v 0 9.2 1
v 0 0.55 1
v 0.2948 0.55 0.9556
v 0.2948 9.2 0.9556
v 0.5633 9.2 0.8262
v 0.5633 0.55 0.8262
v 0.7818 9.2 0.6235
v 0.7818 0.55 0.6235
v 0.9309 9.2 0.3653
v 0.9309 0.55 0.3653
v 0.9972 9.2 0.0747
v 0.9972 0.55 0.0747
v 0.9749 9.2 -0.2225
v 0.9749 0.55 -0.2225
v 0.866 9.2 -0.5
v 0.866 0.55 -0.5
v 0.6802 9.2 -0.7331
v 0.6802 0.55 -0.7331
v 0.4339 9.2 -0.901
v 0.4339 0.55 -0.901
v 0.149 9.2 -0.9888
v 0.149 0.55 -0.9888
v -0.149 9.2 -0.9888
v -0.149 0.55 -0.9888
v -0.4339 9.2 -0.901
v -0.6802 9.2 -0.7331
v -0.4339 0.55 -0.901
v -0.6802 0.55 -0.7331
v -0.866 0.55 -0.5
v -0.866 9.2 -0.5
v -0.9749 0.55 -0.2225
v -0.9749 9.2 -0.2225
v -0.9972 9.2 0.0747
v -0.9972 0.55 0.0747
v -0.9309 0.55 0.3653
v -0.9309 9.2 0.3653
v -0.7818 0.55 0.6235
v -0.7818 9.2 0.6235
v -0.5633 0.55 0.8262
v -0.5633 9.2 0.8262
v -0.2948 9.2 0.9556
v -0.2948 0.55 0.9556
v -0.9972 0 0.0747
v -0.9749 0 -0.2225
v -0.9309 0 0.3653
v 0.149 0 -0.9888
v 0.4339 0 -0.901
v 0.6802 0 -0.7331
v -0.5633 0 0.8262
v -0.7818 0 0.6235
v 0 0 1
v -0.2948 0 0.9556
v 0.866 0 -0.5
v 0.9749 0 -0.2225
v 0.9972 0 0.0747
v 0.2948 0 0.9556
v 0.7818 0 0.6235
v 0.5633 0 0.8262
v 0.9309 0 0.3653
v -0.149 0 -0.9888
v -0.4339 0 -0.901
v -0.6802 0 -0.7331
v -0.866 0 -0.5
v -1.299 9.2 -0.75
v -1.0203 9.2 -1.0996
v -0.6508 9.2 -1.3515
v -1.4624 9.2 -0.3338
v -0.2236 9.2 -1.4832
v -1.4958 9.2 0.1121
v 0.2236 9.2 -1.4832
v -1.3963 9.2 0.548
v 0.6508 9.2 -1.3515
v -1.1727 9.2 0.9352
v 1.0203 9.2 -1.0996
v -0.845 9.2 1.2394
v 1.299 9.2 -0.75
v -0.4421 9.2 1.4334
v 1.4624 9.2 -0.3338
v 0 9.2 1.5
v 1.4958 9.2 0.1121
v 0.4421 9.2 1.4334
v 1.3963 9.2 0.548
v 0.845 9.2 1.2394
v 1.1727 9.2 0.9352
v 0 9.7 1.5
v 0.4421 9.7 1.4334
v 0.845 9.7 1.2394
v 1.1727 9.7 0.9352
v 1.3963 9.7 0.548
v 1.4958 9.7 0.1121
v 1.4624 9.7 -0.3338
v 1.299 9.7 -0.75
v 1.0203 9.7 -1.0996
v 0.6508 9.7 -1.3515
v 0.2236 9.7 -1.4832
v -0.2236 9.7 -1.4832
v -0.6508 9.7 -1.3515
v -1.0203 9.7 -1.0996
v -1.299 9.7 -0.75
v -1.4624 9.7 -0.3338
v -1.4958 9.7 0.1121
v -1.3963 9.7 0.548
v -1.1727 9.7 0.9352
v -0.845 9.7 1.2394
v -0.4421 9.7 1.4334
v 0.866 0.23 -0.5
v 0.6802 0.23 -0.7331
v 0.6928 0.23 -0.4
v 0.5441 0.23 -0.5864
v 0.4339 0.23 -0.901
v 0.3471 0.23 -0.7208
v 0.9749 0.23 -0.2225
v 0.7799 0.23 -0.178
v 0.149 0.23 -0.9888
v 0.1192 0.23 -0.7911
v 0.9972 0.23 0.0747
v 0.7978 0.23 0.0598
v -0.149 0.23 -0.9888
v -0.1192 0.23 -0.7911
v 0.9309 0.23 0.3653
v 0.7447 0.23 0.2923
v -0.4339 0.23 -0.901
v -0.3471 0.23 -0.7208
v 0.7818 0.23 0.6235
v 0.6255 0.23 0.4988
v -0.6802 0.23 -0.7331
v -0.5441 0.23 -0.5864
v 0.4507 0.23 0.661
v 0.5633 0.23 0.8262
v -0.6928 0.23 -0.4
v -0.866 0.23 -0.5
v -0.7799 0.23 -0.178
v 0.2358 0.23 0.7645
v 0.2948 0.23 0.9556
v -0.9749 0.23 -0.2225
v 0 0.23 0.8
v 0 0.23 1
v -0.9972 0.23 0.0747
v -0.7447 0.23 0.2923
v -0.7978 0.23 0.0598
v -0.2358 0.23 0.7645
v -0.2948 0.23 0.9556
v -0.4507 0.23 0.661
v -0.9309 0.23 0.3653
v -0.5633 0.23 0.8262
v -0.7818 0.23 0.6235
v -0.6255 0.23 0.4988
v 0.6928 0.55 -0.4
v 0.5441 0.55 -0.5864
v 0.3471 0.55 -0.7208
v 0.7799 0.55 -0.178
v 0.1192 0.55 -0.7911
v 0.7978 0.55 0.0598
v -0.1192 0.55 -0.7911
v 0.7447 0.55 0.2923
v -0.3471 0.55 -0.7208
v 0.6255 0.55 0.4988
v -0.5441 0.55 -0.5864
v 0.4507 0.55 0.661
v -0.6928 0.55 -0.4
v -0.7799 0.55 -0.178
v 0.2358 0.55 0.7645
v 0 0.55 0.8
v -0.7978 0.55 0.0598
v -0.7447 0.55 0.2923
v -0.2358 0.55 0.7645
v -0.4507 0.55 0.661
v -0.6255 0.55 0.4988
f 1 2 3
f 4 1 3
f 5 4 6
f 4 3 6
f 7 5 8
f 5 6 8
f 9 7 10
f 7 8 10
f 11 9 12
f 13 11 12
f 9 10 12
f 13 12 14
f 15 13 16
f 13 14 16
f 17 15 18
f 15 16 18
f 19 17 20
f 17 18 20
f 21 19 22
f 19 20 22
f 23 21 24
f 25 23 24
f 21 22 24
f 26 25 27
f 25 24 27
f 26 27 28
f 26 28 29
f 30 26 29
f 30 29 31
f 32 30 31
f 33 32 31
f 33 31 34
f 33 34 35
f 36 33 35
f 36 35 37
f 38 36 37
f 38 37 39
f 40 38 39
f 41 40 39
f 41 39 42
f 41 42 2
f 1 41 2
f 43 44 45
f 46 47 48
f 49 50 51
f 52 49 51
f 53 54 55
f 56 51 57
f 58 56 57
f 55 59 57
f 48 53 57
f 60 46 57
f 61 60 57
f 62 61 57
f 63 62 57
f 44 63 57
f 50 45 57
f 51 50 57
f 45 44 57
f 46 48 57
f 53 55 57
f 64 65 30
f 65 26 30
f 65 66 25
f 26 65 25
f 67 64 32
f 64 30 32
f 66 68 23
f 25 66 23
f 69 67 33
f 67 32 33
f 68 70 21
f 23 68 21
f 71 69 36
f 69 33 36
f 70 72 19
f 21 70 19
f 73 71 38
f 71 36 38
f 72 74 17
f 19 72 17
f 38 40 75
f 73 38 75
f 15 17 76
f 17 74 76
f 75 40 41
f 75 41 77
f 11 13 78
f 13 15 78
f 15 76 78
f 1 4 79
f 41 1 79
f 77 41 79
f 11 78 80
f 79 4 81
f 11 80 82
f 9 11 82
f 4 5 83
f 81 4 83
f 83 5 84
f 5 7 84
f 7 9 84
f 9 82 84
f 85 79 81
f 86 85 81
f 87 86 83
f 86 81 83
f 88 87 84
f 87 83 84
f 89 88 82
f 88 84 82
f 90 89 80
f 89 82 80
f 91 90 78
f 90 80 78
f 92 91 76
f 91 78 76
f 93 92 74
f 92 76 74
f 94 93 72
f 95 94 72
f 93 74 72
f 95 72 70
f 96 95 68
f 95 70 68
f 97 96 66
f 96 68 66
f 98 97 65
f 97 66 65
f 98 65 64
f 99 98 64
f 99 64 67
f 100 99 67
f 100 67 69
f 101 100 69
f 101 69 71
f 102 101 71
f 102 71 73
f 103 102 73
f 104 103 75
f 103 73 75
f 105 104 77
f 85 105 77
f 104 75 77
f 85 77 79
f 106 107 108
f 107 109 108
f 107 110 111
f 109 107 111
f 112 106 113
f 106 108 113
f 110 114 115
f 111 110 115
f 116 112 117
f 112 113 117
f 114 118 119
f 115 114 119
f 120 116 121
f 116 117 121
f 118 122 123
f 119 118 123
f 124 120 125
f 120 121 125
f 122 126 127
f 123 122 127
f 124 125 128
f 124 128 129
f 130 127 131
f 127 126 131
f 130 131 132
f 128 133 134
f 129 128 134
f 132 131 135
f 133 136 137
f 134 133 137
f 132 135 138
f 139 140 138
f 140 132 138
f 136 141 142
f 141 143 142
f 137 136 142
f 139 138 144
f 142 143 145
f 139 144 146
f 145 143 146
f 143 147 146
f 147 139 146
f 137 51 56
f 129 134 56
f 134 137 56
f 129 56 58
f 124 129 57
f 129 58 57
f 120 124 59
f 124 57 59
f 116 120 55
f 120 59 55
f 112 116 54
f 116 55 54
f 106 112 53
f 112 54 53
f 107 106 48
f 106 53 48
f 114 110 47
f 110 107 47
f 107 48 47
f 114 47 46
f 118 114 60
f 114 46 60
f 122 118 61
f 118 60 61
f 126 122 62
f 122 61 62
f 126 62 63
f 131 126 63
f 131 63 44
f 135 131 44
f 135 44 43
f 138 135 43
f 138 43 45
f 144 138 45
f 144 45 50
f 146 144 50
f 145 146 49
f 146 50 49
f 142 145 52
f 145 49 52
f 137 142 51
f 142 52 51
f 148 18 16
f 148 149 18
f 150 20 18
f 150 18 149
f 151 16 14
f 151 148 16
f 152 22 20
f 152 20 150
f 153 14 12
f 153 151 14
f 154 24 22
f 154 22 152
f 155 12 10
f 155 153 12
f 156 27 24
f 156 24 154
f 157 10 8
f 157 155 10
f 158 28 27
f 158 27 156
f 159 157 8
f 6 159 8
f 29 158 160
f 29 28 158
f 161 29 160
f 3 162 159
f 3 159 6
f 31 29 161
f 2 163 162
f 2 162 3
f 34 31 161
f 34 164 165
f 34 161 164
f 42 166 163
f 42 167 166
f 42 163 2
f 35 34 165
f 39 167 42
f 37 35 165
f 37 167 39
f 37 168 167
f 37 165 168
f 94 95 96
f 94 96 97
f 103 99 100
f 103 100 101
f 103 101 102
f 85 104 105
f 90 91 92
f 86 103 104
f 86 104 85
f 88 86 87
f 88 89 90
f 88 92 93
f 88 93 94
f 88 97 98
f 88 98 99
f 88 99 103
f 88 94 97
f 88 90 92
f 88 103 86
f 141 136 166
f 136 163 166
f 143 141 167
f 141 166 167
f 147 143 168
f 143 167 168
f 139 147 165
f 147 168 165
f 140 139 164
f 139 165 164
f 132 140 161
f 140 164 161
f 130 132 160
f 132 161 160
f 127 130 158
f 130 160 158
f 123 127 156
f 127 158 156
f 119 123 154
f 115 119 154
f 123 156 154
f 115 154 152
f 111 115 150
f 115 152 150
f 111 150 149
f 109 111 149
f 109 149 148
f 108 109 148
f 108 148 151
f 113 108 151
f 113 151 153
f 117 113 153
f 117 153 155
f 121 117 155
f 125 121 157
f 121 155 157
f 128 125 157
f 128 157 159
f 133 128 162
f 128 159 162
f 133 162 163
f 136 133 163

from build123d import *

# Parameters (mm, degrees)
SKETCH1_R           = 1
BOSS_EXTRUDE1_DEPTH = 9.2
SKETCH2_R           = 1.5
BOSS_EXTRUDE2_DEPTH = 0.5
SKETCH4_W           = 0.2
SKETCH4_H           = 0.32


with BuildPart() as part:
    # Sketch1 → Boss-Extrude1 (new body)
    with BuildSketch(Plane(origin=(0, 0, 0), x_dir=(1, 0, 0), z_dir=(0, 1, 0))):
        with Locations(Location((0, 0, 0), (0, 0, 270))):
            Circle(SKETCH1_R)
    extrude(amount=BOSS_EXTRUDE1_DEPTH)

    # Sketch2 → Boss-Extrude2 (add)
    with BuildSketch(Plane(origin=(0, 9.2, 0), x_dir=(1, 0, 0), z_dir=(0, 1, 0))):
        with Locations(Location((0, 0, 0), (0, 0, 270))):
            Circle(SKETCH2_R)
    extrude(amount=BOSS_EXTRUDE2_DEPTH)

    # Sketch4 → Cut-Revolve4 (revolve, cut)
    with BuildSketch(Plane(origin=(0, 0, 0), x_dir=(0, 0, -1), z_dir=(1, 0, 0))):
        with Locations((-0.9, 0.39)):
            Rectangle(SKETCH4_W, SKETCH4_H)
    revolve(axis=Axis((0, 9.2, 0), (0, -1, 0)), mode=Mode.SUBTRACT)


solid = part.part
